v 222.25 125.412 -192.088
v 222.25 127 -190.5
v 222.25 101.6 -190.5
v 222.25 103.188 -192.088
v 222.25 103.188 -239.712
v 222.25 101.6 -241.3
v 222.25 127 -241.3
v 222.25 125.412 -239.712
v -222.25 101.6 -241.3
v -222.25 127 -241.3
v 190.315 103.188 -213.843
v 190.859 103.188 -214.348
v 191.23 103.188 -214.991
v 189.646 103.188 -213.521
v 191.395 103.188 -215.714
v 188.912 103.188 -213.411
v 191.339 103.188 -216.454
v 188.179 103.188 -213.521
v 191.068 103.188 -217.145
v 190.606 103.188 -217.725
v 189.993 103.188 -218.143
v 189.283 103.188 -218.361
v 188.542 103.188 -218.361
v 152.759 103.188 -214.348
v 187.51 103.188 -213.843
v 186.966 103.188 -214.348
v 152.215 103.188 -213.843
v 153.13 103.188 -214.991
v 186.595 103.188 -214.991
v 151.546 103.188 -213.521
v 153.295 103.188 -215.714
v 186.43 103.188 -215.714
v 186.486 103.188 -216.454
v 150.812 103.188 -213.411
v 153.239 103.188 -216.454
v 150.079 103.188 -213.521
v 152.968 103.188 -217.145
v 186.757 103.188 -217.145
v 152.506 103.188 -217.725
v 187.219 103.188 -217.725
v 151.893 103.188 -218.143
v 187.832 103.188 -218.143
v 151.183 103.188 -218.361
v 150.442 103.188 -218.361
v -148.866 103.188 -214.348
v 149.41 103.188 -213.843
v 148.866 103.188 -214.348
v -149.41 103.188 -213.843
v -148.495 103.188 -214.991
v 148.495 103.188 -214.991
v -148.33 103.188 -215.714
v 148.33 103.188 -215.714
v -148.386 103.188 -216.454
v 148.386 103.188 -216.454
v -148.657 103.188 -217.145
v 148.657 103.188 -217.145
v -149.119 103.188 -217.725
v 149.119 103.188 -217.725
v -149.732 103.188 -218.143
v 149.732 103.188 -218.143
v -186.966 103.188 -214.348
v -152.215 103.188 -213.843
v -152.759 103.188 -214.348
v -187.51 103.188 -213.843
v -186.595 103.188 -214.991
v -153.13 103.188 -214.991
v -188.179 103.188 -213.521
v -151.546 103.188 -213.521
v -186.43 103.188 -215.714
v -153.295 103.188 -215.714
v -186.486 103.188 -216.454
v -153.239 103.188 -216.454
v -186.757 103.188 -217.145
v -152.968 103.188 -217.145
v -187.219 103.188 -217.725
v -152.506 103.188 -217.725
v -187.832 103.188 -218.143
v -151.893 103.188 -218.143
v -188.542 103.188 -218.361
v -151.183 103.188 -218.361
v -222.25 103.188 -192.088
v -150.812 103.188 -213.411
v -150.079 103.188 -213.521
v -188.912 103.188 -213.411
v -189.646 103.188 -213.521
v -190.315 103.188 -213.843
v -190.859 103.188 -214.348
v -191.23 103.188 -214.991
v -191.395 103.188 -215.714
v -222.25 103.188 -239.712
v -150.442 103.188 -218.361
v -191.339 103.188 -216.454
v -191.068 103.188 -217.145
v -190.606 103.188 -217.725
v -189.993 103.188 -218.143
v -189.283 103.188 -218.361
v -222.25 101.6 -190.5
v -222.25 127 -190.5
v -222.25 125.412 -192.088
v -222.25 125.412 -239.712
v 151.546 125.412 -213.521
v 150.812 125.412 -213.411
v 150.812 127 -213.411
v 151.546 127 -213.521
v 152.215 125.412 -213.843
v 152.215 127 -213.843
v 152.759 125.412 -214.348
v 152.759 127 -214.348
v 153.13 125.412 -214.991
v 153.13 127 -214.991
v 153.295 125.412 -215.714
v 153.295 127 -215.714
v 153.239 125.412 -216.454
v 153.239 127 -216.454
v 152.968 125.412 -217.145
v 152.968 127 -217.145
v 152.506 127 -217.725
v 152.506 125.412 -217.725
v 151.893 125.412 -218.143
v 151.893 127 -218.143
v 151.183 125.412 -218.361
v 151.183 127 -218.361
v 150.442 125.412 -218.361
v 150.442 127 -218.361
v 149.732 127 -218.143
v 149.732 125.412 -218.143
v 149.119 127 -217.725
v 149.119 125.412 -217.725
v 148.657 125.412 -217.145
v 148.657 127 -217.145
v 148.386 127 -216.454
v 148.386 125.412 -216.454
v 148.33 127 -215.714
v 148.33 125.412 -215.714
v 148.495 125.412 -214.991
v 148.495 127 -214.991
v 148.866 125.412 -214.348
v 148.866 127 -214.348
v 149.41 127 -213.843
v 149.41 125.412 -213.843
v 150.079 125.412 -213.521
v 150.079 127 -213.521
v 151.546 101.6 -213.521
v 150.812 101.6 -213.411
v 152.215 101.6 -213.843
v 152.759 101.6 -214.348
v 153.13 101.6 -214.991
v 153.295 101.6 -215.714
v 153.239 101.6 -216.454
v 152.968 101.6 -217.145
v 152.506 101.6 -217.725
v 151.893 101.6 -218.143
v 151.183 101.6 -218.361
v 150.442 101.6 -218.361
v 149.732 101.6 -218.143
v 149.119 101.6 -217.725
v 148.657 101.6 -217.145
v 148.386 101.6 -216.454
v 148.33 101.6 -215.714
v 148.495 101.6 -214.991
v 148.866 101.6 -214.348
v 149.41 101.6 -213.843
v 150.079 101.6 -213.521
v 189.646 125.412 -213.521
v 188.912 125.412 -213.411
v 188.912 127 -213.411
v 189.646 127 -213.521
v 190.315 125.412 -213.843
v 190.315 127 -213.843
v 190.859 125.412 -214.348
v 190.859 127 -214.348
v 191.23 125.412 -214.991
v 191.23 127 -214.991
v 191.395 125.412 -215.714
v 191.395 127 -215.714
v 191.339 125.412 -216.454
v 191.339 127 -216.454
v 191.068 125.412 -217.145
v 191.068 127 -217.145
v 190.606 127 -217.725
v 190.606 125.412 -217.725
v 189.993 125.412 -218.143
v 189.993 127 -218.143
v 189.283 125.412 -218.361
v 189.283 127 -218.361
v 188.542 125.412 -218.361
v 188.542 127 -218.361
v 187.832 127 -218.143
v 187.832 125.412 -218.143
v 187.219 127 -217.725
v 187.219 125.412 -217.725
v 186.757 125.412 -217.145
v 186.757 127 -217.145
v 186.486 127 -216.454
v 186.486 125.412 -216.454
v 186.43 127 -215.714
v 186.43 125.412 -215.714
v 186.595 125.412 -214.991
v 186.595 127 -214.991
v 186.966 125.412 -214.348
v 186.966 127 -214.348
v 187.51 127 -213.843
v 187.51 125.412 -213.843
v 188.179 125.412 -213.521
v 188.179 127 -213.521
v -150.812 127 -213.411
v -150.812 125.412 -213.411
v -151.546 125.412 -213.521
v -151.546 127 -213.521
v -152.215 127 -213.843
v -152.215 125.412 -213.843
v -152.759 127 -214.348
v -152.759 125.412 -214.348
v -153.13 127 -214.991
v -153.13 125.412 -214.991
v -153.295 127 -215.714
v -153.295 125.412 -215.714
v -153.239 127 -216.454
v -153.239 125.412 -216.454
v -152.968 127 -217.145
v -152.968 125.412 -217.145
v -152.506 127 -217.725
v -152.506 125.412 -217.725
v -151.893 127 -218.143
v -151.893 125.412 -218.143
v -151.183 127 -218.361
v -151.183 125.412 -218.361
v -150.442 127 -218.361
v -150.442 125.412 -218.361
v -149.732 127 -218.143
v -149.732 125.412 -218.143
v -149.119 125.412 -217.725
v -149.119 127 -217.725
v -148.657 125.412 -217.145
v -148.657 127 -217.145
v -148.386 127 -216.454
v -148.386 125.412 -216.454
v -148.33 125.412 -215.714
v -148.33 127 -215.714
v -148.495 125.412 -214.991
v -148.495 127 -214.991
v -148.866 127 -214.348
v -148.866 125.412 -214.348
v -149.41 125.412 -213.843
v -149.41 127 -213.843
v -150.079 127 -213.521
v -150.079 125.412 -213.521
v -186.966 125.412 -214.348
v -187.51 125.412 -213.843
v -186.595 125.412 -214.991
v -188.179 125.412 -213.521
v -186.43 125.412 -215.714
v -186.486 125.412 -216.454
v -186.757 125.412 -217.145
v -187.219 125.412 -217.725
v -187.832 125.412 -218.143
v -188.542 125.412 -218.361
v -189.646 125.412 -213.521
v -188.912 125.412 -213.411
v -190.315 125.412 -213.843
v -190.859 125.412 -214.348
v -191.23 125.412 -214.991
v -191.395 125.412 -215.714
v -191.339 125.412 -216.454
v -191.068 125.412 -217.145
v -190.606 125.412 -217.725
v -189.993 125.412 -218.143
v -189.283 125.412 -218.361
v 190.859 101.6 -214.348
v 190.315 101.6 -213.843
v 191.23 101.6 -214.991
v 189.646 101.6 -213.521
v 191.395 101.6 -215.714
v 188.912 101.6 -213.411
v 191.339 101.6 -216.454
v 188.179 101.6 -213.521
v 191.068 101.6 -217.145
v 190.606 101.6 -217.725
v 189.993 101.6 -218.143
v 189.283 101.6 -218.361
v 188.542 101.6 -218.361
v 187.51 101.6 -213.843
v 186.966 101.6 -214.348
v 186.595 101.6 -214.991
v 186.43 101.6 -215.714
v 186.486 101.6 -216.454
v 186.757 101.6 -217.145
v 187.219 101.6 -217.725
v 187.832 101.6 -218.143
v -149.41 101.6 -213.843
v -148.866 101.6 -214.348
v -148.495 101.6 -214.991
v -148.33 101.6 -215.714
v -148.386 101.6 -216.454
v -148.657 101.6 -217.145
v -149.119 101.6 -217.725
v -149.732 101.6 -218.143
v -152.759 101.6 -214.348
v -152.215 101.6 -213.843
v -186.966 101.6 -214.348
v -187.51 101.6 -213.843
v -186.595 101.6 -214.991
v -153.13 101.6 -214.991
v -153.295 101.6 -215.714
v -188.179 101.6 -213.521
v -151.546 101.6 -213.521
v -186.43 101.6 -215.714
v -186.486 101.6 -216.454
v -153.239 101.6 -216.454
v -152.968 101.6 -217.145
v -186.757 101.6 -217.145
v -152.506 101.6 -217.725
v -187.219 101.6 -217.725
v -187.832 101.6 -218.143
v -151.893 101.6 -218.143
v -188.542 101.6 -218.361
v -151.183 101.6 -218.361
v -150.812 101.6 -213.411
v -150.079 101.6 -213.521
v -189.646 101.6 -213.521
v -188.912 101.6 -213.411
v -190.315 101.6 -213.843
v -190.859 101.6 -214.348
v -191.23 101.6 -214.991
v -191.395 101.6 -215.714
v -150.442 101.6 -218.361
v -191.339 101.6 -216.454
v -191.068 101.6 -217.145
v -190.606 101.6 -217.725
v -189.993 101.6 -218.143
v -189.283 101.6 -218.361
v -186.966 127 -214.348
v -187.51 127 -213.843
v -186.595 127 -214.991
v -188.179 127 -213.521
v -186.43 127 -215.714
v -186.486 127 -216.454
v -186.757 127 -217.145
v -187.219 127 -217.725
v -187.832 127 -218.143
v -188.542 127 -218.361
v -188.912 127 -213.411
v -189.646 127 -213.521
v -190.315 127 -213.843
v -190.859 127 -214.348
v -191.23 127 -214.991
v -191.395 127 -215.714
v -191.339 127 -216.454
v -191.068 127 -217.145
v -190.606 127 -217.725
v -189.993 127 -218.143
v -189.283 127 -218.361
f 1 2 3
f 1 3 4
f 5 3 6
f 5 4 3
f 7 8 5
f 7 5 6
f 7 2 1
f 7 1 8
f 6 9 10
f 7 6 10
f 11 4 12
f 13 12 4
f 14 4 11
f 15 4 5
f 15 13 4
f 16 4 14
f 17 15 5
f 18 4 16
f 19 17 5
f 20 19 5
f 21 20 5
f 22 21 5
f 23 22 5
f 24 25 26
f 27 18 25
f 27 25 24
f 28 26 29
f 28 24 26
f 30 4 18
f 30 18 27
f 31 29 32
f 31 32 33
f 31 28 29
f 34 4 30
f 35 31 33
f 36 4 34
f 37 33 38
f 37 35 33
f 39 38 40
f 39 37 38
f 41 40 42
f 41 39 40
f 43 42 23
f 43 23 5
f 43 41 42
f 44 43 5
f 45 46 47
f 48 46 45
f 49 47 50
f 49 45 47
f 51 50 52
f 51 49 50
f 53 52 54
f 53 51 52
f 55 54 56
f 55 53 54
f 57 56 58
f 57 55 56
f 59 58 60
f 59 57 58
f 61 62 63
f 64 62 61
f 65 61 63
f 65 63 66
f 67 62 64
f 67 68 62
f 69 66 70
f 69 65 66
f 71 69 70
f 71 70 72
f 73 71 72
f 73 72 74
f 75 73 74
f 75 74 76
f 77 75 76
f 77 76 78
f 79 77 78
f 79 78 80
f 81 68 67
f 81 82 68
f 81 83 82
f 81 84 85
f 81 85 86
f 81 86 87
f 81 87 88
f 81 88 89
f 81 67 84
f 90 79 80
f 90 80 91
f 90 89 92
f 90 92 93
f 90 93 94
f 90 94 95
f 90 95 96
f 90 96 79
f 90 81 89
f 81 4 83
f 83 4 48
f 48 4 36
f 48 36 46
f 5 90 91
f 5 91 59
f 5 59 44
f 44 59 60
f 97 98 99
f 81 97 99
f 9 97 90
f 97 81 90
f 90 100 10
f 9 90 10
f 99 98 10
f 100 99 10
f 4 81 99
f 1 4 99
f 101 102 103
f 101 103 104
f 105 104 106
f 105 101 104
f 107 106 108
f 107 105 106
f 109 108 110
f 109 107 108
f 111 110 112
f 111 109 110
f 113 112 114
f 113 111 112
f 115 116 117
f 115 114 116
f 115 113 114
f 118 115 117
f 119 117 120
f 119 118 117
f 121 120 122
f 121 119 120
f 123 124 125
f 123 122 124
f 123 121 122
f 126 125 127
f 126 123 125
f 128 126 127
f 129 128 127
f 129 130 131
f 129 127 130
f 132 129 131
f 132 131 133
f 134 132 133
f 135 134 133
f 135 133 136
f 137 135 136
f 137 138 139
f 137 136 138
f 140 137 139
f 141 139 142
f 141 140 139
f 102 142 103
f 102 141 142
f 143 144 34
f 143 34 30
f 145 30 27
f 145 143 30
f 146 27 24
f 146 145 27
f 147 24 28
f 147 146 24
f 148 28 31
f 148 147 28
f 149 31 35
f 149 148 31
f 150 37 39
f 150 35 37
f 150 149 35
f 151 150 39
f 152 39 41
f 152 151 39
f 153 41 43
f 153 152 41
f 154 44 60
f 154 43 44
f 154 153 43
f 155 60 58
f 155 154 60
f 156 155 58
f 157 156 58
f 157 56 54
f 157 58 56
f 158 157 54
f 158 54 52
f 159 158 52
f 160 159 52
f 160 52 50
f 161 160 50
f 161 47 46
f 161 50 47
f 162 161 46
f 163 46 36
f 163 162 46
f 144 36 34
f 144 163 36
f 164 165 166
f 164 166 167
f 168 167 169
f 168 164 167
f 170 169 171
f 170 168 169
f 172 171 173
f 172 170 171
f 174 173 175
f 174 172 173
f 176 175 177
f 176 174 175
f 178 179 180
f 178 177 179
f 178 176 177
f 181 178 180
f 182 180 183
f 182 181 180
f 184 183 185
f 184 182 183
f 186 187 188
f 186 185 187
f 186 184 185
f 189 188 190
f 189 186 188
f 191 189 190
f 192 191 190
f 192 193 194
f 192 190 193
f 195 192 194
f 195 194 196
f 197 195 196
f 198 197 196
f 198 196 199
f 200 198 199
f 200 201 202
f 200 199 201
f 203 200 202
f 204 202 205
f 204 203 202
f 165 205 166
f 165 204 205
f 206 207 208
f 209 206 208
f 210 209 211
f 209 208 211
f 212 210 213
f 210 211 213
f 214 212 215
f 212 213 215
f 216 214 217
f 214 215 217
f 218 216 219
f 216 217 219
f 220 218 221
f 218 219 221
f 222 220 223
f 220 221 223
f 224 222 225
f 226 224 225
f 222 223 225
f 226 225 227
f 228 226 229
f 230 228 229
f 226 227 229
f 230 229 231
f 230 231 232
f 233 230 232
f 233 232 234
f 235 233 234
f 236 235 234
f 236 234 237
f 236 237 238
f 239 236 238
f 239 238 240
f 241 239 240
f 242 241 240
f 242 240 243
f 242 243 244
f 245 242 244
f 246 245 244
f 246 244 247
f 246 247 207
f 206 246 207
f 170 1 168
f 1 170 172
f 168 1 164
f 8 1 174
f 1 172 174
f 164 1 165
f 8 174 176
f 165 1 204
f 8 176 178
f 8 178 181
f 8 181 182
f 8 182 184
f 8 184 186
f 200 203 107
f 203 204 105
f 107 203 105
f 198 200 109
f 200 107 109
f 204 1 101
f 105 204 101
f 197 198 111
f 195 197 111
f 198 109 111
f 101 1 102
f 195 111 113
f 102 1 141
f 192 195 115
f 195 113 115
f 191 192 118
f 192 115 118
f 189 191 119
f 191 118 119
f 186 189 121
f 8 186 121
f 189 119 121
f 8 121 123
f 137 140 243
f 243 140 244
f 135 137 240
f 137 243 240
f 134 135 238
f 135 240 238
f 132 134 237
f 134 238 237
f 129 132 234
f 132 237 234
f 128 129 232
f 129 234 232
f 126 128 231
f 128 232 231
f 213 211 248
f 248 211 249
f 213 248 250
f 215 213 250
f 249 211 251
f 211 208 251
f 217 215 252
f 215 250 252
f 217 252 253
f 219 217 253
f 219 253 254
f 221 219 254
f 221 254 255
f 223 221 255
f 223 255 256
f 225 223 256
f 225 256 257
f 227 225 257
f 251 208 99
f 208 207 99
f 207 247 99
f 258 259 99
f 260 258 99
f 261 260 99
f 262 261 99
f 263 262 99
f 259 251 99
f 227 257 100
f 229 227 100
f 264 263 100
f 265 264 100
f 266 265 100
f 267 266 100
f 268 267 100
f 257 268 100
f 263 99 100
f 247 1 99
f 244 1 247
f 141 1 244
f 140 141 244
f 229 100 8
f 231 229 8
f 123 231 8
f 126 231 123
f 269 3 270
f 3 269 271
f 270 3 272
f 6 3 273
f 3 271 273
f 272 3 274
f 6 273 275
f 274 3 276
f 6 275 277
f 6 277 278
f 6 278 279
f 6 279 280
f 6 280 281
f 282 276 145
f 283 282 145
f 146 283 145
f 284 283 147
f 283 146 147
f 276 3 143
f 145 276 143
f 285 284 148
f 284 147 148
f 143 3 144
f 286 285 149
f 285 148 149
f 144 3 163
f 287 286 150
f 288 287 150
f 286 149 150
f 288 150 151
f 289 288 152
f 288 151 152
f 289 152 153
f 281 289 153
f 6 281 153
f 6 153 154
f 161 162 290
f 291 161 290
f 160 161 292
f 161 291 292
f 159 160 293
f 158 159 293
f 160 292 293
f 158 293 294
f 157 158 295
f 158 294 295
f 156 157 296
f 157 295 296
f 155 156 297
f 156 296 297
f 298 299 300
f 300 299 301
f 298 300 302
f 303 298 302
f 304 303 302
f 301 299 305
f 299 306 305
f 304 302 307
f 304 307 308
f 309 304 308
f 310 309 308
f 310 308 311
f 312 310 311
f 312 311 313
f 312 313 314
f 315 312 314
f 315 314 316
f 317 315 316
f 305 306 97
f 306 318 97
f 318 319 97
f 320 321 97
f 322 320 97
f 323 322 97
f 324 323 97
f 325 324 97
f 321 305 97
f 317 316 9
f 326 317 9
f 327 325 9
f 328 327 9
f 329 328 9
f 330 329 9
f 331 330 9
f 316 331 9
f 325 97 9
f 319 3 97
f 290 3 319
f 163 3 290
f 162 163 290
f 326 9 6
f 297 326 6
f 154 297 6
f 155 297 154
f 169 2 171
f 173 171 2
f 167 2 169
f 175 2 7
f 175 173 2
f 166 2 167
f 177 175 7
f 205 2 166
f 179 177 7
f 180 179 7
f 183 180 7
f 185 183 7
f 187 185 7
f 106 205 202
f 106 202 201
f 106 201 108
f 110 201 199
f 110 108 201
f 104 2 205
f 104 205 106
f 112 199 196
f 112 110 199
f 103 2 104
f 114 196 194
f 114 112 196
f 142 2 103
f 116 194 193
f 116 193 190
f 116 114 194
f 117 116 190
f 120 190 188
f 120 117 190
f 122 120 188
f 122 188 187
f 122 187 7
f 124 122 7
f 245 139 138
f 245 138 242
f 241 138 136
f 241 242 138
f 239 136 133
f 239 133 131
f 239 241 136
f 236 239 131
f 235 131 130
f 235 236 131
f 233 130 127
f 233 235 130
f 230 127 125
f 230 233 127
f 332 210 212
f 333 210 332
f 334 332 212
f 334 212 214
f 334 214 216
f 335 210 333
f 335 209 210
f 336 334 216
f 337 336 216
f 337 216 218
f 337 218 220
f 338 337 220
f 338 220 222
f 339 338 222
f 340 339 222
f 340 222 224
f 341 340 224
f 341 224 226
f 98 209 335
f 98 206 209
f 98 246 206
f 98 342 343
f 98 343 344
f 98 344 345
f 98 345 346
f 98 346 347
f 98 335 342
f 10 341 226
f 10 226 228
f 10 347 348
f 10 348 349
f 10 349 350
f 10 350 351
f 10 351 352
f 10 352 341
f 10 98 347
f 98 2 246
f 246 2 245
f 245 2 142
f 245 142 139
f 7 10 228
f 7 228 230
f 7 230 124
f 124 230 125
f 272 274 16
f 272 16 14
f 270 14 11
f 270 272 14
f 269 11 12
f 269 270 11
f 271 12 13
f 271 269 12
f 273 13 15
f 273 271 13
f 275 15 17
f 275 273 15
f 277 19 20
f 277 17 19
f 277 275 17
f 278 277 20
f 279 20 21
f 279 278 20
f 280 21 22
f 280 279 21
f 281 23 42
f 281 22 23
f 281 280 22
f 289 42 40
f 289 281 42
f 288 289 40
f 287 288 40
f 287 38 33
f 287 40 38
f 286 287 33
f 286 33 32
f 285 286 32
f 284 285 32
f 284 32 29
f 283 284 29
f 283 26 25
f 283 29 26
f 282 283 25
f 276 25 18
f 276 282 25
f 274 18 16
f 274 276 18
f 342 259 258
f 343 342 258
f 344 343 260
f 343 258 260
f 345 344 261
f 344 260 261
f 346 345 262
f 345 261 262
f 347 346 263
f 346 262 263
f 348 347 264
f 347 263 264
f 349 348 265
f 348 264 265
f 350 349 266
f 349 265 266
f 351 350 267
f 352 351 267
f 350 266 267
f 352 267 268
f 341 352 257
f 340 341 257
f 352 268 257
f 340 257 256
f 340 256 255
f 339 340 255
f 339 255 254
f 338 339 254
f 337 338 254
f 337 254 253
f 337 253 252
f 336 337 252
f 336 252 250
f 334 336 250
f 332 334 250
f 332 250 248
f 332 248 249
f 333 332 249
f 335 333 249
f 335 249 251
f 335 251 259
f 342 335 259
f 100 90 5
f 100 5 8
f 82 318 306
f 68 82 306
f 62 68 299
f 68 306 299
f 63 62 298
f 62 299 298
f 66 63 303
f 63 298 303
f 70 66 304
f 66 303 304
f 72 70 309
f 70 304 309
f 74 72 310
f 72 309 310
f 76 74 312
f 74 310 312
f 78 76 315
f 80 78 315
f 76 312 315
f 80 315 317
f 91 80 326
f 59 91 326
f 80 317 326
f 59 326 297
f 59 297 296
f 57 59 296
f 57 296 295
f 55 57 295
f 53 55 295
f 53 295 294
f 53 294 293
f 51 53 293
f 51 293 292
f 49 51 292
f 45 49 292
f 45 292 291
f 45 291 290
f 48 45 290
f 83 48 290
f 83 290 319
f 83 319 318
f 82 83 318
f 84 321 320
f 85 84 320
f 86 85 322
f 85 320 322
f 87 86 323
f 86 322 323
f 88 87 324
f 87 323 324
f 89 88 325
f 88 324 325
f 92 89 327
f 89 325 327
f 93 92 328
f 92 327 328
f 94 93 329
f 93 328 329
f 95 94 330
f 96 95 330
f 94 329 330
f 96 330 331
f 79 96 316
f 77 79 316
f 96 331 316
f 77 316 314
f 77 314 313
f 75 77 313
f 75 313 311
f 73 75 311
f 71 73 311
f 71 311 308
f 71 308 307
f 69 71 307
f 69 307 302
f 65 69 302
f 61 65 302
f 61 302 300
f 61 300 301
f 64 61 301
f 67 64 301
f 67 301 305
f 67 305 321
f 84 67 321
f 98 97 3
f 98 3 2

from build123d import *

# Parameters (mm, degrees)
BOSS_EXTRUDE1_DEPTH      = 222.25
BOSS_EXTRUDE1_DEPTH_BACK = 222.25
SKETCH2_W                = 50.8
SKETCH2_H                = 25.4
SKETCH2_W_2              = 47.625
SKETCH2_H_2              = 22.225
SKETCH4_R                = 2.4892
CUT_EXTRUDE2_DEPTH       = 352.780830205


with BuildPart() as part:
    # Sketch2 → Boss-Extrude1 (new, two sides: drawn at the far end of the back side and taken through both)
    with BuildSketch(Plane(origin=(0, 0, 0), x_dir=(0, 0, -1), z_dir=(1, 0, 0)).offset(-BOSS_EXTRUDE1_DEPTH_BACK)):
        with Locations((215.9, 114.3)):
            Rectangle(SKETCH2_W, SKETCH2_H)
        with Locations((215.9, 114.3)):
            Rectangle(SKETCH2_W_2, SKETCH2_H_2, mode=Mode.SUBTRACT)
    extrude(amount=BOSS_EXTRUDE1_DEPTH + BOSS_EXTRUDE1_DEPTH_BACK)

    # Sketch4 → Cut-Extrude2 (cut, through all)
    with BuildSketch(Plane(origin=(0, 0, 0), x_dir=(1, 0, 0), z_dir=(0, 1, 0))):
        with Locations(Location((150.8125, 215.9, 0), (0, 0, 270))):
            Circle(SKETCH4_R)
        with Locations(Location((188.9125, 215.9, 0), (0, 0, 270))):
            Circle(SKETCH4_R)
    cut_extrude2 = extrude(amount=CUT_EXTRUDE2_DEPTH, mode=Mode.SUBTRACT)

    # Mirror2: Cut-Extrude2 across plane
    add(cut_extrude2.mirror(Plane(origin=(0, 0, 0), x_dir=(0, 0, 1), z_dir=(1, 0, 0))), mode=Mode.SUBTRACT)


solid = part.part
